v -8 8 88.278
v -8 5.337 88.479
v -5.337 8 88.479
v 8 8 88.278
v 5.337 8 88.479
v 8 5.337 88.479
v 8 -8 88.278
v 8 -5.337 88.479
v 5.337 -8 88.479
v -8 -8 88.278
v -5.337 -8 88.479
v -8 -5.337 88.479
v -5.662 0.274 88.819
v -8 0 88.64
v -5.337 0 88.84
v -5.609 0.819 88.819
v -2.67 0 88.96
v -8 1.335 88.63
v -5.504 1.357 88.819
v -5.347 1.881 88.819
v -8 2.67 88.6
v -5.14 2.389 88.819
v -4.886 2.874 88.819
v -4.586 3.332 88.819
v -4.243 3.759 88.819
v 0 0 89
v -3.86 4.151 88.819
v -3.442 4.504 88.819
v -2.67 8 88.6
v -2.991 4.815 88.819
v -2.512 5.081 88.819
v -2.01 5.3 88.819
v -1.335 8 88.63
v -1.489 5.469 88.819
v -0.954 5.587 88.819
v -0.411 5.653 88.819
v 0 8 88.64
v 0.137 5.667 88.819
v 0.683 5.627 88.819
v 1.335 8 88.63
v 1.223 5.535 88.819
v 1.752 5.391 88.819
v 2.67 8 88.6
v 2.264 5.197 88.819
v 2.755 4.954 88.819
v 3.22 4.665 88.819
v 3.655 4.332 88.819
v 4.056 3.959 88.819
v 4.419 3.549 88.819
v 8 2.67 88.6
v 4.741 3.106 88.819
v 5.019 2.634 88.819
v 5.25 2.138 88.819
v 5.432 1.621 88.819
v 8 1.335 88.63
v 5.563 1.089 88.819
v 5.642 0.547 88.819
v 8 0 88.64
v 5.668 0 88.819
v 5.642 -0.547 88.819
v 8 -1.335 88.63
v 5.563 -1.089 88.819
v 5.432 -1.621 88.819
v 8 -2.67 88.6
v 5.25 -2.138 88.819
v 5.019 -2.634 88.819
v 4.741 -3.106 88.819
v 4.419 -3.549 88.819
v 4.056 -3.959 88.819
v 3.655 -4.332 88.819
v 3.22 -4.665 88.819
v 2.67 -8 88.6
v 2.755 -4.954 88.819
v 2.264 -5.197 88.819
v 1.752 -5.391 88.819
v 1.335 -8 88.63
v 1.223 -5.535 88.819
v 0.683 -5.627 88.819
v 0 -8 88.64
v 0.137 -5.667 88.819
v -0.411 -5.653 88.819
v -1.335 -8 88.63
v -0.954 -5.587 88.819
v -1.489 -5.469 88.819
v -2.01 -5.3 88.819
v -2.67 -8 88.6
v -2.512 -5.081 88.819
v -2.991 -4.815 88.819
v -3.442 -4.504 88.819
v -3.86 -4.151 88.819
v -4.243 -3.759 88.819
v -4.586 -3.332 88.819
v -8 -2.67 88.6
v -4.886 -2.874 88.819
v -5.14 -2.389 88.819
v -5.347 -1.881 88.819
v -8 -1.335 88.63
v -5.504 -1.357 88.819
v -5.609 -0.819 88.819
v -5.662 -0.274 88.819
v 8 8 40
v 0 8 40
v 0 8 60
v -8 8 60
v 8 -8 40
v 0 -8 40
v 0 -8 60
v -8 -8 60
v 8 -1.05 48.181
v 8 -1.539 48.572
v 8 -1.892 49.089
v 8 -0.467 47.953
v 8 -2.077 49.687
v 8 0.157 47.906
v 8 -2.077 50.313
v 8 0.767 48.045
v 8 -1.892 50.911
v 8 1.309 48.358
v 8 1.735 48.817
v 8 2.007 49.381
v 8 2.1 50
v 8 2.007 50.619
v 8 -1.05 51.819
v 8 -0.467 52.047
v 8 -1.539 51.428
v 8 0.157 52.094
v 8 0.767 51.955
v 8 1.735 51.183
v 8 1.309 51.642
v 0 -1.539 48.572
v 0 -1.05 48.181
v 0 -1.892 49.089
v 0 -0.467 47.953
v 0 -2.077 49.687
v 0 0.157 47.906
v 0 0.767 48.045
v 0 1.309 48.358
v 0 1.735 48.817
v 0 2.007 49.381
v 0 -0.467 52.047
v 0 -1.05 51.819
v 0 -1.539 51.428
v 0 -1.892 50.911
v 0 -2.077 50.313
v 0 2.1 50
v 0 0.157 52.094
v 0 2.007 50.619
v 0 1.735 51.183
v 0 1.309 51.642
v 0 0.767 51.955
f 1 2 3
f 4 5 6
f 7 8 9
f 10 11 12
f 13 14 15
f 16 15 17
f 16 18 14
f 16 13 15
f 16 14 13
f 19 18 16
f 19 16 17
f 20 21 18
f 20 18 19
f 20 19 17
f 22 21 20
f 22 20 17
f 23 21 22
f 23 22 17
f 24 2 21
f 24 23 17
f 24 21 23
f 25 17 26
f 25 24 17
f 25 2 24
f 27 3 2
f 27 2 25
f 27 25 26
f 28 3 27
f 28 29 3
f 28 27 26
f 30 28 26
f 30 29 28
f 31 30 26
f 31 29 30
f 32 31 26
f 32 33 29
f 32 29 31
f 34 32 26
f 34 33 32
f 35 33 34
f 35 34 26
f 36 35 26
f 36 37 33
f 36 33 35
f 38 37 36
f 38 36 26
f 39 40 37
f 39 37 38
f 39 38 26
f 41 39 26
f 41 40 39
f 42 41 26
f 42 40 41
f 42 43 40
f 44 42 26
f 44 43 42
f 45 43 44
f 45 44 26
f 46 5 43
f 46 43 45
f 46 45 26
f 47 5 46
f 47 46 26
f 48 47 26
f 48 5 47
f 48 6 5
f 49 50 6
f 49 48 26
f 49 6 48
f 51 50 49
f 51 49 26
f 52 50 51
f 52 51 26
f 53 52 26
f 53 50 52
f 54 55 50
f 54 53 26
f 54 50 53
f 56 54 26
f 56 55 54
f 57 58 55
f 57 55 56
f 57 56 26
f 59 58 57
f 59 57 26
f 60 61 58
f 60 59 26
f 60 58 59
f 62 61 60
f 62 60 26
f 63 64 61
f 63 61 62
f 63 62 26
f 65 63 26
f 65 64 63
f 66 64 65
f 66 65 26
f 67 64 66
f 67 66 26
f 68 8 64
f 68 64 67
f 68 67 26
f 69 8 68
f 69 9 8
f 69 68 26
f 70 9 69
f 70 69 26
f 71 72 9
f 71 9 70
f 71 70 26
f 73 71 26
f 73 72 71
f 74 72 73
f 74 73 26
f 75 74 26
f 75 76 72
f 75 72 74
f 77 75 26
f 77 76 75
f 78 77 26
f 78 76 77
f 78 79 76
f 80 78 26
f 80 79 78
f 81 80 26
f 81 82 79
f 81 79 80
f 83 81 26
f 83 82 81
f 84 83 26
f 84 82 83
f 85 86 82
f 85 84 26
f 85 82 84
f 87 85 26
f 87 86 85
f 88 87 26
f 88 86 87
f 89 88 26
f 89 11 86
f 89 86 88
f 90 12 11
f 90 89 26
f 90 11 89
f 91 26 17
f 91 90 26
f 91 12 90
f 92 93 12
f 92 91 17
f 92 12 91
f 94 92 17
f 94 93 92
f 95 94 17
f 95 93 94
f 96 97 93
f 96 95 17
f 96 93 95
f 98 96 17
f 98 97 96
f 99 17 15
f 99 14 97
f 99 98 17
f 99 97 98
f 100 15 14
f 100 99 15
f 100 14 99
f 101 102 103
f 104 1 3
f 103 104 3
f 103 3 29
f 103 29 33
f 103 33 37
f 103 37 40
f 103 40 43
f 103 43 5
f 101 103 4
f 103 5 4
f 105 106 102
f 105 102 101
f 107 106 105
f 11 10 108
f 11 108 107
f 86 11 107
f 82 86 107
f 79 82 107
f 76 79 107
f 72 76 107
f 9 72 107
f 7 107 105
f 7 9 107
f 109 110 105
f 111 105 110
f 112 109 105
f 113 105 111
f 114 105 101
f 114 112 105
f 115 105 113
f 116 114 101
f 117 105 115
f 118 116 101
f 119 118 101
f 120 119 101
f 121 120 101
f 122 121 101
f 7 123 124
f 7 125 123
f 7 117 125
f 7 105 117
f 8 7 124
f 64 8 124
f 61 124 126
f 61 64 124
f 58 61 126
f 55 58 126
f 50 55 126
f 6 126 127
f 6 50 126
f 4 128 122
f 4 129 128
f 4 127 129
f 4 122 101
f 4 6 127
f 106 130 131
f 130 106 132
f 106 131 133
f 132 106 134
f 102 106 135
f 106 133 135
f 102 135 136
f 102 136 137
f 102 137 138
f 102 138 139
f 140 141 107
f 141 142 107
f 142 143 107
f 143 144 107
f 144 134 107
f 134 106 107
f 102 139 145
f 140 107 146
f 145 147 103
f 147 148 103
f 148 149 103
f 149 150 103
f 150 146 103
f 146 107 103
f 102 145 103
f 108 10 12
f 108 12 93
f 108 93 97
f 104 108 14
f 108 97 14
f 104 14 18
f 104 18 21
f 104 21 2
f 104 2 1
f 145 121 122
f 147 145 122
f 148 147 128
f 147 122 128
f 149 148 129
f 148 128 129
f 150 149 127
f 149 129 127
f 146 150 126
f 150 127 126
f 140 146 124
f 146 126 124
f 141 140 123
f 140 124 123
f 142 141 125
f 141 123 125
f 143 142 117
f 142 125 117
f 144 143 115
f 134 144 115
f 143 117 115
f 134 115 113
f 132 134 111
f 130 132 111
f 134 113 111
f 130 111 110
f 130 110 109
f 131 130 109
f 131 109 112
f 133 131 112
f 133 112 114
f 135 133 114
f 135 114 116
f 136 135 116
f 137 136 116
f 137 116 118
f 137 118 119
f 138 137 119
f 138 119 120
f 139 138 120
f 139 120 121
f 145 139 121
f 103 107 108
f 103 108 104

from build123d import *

# Parameters (mm, degrees)
F2_W     = 16
F2_H     = 16
F3_DEPTH = 100
F4_W     = 20
F4_H     = 140
F5_DEPTH = 12.5
F6_W     = 16
F6_H     = 20
F7_DEPTH = 25
F9_D     = 4.2


with BuildPart() as f1:
    # F0 (on Front) → F1 (revolve)
    with BuildSketch(Plane.XZ):
        with BuildLine():
            Line((0, -89), (0, 89))
            ThreePointArc((0, 89), (-89, 0), (0, -89))
        make_face()
    revolve(axis=Axis((0, 0, 0), (0, 0, -1)))

    # F2 (on Top) → F3 (intersect, symmetric)
    with BuildSketch(Plane.XY):
        Rectangle(F2_W, F2_H)
    extrude(amount=F3_DEPTH, both=True, mode=Mode.INTERSECT)

    # F4 (on Front) → F5 (cut, symmetric)
    with BuildSketch(Plane.XZ):
        with Locations((0, -30)):
            Rectangle(F4_W, F4_H)
    extrude(amount=F5_DEPTH, both=True, mode=Mode.SUBTRACT)

    # F6 (on Right) → F7 (cut)
    with BuildSketch(Plane.YZ):
        with Locations((0, 50)):
            Rectangle(F6_W, F6_H)
    extrude(amount=-F7_DEPTH, mode=Mode.SUBTRACT)

    # F9 (through all)
    with Locations(Plane(origin=(0, 0, 0), x_dir=(0, -1, 0), z_dir=(-1, 0, 0))):
        with Locations((0, 50)):
            Hole(F9_D / 2)


solid = f1.part
